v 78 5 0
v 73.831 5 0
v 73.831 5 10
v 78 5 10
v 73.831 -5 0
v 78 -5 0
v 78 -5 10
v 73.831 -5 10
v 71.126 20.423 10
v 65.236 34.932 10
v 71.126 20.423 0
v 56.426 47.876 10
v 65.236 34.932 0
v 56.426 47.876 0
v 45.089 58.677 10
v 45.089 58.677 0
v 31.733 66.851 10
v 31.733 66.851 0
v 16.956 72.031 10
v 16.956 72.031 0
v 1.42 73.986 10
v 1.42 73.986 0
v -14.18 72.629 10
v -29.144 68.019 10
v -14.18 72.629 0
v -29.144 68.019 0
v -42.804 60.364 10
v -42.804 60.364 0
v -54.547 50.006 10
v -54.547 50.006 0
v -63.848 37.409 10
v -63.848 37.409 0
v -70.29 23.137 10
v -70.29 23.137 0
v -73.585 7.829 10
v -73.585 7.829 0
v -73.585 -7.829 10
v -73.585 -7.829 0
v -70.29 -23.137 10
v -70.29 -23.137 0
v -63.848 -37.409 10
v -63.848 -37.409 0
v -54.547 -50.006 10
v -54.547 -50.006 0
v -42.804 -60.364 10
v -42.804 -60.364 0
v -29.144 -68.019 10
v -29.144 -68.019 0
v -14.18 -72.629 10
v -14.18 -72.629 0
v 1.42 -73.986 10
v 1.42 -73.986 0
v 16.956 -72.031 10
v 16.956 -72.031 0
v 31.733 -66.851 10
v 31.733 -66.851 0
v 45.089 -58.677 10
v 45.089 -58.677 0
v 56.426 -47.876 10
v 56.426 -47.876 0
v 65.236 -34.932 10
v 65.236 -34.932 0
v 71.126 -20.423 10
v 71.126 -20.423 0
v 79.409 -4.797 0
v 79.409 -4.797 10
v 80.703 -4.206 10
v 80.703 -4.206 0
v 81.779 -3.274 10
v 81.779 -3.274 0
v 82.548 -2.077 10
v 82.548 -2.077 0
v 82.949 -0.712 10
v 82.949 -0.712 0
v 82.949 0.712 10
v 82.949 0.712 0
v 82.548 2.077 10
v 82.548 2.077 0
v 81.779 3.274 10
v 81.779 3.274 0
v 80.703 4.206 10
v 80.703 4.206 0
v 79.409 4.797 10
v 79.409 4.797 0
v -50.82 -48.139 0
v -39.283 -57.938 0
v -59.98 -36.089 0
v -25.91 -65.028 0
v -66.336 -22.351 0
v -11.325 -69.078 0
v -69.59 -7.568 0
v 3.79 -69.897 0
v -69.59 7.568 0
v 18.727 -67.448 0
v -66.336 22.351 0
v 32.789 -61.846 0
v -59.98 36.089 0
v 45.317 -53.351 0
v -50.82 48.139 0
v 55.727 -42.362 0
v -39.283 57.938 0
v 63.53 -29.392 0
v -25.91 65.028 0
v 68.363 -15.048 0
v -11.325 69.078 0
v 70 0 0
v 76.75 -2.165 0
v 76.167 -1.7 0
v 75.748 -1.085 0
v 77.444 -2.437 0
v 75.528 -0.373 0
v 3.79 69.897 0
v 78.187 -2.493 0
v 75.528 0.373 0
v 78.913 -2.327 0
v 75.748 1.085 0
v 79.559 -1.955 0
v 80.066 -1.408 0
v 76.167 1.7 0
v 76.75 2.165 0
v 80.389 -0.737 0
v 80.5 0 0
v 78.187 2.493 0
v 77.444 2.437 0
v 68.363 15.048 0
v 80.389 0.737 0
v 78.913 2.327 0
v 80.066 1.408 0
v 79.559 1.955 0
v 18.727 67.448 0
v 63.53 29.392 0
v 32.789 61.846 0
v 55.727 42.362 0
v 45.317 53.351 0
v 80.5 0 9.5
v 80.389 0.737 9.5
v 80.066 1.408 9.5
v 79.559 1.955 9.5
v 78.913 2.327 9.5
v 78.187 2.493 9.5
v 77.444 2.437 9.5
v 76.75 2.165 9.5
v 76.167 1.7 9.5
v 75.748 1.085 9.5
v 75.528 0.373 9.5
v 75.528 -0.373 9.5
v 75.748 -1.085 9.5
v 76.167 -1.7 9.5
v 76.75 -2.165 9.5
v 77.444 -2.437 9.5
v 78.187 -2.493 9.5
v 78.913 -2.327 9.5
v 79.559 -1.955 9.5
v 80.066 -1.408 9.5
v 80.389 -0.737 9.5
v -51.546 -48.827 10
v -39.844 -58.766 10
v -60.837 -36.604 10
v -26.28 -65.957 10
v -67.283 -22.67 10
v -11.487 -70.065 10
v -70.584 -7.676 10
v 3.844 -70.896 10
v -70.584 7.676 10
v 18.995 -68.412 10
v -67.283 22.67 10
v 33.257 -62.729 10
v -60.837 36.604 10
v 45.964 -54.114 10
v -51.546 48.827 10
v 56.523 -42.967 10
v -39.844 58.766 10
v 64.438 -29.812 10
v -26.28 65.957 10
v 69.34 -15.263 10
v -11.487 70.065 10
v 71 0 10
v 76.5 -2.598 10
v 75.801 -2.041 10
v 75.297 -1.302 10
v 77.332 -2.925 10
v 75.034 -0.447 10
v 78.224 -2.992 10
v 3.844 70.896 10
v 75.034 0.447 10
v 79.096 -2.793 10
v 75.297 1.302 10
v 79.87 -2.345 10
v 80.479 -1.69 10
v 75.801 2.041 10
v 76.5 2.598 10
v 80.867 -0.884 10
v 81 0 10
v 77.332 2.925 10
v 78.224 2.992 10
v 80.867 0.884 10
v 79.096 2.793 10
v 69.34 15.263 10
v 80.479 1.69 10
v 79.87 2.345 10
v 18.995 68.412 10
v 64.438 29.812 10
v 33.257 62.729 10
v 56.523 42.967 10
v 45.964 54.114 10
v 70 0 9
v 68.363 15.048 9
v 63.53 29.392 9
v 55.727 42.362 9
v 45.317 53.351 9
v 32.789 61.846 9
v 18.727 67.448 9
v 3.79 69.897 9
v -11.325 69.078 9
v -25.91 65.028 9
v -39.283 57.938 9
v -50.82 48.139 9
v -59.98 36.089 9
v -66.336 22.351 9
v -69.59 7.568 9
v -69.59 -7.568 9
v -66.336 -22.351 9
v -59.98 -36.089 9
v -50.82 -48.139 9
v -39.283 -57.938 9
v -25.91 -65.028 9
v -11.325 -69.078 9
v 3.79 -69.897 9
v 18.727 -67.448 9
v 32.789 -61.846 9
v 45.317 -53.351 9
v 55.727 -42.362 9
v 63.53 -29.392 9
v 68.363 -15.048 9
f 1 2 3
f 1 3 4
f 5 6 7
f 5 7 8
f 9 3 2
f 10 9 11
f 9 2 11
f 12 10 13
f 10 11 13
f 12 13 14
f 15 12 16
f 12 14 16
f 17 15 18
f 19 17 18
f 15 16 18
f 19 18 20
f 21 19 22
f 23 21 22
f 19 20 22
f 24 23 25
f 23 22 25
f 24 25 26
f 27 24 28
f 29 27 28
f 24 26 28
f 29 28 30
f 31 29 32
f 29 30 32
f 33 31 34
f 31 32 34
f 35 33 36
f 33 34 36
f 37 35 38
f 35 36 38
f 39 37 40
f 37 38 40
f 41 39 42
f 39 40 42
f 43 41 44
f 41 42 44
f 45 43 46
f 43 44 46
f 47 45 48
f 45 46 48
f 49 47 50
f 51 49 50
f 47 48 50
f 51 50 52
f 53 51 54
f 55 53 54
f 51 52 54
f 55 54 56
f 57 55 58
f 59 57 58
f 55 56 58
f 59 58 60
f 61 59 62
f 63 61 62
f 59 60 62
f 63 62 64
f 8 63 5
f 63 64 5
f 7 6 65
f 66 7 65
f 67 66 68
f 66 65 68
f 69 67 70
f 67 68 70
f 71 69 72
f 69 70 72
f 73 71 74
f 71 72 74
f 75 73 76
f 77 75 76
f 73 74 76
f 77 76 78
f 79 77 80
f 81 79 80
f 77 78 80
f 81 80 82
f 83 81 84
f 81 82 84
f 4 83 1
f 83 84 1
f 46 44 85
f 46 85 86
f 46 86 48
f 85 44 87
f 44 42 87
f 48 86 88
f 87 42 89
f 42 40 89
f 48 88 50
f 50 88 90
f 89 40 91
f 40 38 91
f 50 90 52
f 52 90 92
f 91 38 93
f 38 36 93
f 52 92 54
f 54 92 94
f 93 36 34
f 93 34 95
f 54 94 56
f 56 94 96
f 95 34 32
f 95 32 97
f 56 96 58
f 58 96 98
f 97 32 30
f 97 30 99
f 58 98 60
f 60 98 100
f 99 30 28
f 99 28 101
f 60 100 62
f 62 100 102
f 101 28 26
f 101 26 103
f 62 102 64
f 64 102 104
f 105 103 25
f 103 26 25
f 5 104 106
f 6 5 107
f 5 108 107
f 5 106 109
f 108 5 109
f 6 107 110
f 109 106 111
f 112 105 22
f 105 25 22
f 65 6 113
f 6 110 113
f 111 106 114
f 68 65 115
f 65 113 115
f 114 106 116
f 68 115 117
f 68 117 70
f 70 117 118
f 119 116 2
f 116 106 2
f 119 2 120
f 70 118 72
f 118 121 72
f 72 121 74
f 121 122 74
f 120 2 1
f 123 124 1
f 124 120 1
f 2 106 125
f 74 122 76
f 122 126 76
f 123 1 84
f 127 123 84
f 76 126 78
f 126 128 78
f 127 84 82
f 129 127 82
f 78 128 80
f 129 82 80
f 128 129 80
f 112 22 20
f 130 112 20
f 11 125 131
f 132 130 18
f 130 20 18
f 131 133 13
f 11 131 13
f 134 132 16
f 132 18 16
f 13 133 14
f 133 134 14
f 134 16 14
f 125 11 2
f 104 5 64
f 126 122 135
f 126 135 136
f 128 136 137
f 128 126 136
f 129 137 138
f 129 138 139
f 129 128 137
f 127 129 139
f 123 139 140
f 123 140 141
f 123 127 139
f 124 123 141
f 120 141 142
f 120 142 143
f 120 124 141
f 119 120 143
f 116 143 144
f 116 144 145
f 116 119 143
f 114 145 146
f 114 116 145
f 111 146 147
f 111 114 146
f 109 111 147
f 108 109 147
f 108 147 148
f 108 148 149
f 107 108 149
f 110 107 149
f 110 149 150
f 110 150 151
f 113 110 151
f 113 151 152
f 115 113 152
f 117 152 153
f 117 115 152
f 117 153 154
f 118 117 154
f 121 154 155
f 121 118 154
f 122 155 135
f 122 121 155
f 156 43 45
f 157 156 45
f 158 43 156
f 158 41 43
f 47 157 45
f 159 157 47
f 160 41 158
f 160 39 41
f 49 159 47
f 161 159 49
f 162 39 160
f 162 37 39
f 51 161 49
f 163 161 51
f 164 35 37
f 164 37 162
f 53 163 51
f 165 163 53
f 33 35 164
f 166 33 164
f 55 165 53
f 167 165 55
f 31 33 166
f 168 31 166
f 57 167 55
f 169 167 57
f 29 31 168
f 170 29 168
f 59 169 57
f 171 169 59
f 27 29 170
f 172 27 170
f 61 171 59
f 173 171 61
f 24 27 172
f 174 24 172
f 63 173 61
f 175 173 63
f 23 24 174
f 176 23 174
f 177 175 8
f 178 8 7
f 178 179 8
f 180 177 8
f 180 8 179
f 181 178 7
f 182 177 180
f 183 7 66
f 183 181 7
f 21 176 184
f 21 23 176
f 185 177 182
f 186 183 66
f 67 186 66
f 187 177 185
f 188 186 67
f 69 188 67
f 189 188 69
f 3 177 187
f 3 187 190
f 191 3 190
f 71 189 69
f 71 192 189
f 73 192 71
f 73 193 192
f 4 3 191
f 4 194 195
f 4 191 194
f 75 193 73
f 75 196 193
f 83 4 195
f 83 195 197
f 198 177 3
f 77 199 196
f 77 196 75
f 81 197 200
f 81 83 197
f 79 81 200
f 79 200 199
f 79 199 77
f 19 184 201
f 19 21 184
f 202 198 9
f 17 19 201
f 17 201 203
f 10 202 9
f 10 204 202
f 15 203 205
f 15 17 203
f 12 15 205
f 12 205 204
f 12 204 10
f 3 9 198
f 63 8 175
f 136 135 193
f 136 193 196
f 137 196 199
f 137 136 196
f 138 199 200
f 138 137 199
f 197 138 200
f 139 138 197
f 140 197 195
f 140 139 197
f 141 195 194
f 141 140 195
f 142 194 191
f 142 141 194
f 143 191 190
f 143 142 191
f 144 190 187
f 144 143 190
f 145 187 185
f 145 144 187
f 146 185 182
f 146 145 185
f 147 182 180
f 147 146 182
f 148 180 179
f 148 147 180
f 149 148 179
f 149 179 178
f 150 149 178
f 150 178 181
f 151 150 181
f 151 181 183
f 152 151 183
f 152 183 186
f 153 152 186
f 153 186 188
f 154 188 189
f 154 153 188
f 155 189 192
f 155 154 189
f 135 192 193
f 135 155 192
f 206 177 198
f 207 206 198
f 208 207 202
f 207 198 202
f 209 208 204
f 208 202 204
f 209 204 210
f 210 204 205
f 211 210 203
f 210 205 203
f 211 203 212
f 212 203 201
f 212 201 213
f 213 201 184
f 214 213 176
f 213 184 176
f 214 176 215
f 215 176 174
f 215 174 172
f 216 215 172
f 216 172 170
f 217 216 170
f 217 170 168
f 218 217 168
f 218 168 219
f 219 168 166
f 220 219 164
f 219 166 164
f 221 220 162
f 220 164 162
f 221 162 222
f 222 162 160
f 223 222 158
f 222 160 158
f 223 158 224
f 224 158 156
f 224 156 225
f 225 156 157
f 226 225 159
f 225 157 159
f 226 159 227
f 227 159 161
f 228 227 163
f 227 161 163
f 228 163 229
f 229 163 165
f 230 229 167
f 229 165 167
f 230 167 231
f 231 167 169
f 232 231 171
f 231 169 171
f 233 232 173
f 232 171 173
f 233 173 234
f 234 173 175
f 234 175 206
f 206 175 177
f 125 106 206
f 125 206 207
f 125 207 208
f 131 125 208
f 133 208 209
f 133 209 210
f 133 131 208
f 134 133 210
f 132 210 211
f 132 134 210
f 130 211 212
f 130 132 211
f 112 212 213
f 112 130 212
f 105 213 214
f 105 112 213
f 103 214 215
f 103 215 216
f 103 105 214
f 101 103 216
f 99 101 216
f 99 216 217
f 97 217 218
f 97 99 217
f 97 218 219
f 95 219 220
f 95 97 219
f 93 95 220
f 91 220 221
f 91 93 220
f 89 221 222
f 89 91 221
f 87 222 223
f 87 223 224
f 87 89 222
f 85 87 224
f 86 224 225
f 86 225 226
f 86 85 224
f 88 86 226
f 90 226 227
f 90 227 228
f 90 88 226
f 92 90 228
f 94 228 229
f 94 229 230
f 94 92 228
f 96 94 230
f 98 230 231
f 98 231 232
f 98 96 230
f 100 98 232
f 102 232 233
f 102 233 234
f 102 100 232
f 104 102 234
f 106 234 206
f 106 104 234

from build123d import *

# Parameters (mm, degrees)
SKETCH_R        = 70
SKETCH_R_2      = 2.5
PAD_DEPTH       = 10
CHAMFER_SIZE    = 1
CHAMFER001_SIZE = 0.5


with BuildPart() as part:
    # Sketch → Pad (new body)
    with BuildSketch(Plane.XY):
        with BuildLine():
            ThreePointArc((73.830888, 5), (-74, 0), (73.830888, -5))
            Line((78, -5), (73.830888, -5))
            ThreePointArc((78, -5), (83, 0), (78, 5))
            Line((73.830888, 5), (78, 5))
        make_face()
        Circle(SKETCH_R, mode=Mode.SUBTRACT)
        with Locations((78, 0)):
            Circle(SKETCH_R_2, mode=Mode.SUBTRACT)
    extrude(amount=PAD_DEPTH)

    # Chamfer
    chamfer_edges = [part.edges().sort_by_distance(p)[0] for p in [
        (-70, 0, 10),
    ]]
    chamfer(chamfer_edges, length=CHAMFER_SIZE)

    # Chamfer001
    chamfer001_edges = [part.edges().sort_by_distance(p)[0] for p in [
        (75.5, 0, 10),
    ]]
    chamfer(chamfer001_edges, length=CHAMFER001_SIZE)


solid = part.part
